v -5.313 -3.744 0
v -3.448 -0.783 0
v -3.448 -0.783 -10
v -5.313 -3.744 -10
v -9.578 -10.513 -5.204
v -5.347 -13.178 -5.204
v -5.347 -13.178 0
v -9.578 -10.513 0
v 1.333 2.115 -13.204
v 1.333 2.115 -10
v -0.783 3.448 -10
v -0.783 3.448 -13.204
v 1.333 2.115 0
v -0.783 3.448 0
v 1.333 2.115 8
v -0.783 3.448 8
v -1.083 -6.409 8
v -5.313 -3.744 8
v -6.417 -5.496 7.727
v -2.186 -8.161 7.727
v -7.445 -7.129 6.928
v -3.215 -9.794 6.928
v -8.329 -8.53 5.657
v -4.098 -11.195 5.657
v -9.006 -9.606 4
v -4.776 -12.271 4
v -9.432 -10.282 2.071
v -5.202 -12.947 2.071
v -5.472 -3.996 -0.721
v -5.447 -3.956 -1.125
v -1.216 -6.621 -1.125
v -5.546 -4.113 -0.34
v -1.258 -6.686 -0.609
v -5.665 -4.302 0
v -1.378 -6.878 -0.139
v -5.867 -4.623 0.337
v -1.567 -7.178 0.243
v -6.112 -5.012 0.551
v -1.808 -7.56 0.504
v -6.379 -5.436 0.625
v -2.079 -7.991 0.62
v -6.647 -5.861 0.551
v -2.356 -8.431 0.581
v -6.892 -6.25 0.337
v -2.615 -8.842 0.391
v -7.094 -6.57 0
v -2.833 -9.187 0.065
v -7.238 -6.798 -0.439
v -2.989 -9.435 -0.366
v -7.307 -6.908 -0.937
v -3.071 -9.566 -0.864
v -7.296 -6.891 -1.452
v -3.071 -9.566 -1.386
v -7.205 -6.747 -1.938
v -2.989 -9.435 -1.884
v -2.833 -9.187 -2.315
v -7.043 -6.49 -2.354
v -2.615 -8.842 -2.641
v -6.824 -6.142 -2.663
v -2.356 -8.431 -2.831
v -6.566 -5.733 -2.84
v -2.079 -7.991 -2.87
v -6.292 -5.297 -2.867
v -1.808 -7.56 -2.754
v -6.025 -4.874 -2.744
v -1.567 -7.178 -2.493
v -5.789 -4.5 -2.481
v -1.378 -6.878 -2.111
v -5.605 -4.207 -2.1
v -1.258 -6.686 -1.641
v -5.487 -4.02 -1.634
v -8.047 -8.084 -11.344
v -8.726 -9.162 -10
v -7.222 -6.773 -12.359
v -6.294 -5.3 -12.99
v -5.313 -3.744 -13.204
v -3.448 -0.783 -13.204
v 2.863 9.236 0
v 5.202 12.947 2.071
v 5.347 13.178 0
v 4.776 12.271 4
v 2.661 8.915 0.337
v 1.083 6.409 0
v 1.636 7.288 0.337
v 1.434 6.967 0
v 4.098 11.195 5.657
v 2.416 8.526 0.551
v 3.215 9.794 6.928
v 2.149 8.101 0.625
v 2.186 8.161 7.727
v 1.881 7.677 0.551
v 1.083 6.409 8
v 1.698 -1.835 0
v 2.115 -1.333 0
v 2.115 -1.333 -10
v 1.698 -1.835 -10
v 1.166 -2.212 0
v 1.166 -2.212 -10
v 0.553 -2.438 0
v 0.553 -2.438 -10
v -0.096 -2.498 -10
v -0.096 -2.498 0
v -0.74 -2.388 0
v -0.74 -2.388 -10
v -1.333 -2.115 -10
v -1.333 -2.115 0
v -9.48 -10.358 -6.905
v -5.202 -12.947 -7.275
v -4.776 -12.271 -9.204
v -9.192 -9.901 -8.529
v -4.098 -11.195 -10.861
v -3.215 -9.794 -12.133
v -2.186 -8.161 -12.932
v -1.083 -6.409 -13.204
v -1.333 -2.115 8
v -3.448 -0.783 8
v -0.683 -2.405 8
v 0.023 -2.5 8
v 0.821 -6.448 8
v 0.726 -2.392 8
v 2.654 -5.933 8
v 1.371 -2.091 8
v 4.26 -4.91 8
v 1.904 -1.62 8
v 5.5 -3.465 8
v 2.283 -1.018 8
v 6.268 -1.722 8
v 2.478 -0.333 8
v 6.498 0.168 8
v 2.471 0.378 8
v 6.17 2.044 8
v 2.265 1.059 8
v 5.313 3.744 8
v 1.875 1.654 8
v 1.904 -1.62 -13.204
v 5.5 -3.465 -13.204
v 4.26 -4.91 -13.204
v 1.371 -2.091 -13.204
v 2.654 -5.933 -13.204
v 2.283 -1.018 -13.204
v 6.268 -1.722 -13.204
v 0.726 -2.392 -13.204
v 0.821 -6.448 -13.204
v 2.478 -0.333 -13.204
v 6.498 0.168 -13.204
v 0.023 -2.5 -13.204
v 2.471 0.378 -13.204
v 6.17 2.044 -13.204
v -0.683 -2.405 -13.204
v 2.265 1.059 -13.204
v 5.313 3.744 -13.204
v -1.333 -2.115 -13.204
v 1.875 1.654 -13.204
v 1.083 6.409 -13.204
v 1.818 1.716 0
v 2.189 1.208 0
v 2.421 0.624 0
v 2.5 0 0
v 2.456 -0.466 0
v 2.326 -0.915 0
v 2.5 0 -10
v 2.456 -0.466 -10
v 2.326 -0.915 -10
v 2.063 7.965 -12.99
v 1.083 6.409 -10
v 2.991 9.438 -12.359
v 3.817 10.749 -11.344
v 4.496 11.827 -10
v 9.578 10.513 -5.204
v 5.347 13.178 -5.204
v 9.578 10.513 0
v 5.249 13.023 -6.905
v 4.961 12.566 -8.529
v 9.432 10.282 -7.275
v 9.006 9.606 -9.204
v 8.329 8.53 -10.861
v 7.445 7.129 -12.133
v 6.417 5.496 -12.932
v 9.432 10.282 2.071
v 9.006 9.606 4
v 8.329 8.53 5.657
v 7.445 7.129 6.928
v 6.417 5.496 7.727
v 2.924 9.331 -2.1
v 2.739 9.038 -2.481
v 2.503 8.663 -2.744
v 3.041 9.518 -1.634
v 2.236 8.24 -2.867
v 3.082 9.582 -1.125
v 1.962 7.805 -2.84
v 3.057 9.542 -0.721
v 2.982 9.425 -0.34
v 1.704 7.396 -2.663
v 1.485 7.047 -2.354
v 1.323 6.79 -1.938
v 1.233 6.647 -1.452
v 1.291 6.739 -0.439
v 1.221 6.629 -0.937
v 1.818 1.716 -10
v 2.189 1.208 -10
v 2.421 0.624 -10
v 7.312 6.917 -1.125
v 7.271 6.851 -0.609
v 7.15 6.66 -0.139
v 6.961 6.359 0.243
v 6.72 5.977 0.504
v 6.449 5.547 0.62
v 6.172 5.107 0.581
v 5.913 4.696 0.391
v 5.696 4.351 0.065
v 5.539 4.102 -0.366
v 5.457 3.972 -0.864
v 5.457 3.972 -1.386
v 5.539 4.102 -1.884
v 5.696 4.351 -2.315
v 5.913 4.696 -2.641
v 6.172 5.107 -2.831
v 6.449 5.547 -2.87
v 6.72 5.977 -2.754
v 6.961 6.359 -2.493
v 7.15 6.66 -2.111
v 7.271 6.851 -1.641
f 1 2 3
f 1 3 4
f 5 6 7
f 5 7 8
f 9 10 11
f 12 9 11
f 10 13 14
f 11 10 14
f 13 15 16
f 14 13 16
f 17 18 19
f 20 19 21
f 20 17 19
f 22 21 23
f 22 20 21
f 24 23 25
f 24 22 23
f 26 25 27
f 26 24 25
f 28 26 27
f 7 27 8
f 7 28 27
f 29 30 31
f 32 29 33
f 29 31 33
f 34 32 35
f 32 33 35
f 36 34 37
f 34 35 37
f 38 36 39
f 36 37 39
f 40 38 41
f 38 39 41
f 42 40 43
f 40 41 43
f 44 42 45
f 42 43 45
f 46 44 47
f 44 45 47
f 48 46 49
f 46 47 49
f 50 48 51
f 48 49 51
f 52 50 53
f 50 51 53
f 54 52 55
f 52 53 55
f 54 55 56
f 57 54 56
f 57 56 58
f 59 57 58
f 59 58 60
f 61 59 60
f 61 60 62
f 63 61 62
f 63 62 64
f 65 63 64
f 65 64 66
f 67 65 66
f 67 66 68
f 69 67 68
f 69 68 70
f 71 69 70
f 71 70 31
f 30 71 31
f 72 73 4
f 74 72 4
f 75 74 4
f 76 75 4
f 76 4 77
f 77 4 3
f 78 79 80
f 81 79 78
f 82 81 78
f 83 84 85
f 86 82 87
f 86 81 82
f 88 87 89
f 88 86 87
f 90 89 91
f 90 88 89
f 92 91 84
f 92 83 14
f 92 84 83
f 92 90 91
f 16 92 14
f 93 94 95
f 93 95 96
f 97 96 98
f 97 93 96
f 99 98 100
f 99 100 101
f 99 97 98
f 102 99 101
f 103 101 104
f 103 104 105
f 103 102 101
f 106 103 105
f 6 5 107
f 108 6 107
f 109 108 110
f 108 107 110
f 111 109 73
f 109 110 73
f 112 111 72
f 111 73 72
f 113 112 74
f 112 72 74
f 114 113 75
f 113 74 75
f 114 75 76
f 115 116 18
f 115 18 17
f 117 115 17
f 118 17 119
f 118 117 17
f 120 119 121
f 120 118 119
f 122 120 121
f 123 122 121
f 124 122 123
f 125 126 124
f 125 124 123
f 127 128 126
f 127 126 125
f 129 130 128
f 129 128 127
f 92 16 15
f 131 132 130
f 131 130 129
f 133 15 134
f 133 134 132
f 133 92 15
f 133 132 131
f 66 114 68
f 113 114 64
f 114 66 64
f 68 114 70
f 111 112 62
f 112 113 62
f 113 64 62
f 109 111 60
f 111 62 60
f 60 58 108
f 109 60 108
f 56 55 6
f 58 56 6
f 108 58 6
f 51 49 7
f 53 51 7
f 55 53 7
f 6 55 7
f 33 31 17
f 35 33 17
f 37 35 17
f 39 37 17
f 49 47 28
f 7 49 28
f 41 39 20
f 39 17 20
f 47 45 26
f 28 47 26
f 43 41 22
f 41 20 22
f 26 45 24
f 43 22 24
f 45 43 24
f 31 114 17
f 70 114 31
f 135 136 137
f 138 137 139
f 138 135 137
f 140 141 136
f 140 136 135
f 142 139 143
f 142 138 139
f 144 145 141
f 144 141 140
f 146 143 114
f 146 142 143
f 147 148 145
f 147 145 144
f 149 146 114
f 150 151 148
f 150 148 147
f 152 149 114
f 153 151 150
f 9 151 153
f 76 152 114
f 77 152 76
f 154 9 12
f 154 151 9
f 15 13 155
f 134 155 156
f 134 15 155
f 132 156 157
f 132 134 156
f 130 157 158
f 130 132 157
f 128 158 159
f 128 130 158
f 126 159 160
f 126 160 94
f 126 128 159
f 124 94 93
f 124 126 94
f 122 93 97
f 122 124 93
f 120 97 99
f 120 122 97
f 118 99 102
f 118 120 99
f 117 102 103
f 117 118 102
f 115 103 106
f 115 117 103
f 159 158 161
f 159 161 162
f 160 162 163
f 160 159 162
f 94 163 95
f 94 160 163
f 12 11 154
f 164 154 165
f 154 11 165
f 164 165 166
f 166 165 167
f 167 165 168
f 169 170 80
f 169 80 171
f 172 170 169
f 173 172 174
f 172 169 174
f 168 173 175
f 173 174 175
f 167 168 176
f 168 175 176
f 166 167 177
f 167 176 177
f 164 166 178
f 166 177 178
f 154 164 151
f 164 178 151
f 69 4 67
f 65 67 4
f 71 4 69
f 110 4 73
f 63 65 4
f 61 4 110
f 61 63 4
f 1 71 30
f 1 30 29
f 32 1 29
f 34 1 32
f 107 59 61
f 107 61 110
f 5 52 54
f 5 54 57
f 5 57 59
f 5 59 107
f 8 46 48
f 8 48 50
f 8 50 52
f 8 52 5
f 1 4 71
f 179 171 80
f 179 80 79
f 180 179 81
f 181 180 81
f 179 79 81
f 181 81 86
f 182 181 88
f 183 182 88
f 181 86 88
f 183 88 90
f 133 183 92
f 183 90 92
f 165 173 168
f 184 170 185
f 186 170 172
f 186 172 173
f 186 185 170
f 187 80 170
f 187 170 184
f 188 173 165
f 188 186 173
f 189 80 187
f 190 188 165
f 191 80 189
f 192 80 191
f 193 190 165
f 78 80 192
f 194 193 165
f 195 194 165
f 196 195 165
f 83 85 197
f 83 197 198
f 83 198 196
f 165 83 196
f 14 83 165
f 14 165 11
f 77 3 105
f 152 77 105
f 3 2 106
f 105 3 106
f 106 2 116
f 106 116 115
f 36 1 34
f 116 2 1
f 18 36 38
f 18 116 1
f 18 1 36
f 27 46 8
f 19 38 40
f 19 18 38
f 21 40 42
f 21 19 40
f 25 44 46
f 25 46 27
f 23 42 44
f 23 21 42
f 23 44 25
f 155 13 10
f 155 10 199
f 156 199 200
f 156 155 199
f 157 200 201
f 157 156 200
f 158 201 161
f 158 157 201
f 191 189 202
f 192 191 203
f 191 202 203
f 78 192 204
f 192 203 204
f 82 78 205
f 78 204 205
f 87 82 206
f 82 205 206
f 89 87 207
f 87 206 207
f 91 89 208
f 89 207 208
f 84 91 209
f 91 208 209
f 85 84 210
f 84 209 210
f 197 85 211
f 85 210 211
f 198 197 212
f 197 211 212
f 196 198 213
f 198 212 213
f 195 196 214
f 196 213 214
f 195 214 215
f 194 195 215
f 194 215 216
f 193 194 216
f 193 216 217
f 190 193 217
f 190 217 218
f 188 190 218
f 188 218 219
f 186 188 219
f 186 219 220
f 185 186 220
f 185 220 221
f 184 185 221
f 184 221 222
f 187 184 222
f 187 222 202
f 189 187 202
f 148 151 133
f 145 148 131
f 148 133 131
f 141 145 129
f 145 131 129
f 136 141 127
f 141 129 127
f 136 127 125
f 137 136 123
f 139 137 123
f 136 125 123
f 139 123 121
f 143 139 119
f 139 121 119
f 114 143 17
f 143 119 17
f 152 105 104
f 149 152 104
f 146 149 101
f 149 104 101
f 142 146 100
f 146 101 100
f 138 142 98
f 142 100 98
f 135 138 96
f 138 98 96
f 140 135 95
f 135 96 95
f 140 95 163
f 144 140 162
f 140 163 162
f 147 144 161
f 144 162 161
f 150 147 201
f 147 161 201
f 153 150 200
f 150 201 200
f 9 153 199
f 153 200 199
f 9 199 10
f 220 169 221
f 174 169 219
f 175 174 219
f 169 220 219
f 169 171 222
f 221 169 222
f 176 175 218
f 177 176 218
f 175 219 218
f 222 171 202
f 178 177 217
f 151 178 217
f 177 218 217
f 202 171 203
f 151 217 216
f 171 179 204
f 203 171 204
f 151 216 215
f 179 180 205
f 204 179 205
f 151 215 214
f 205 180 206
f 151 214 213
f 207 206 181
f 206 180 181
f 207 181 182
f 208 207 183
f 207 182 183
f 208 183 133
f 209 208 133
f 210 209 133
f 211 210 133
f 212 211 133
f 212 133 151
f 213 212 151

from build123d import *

# Parameters (mm, degrees)
BOSS_EXTRUDE2_DEPTH = 10
BOSS_EXTRUDE3_START = 8
BOSS_EXTRUDE3_DEPTH = 8
CUT_EXTRUDE1_REACH  = 23.149
SKETCH3_R           = 1.75
BOSS_EXTRUDE4_DEPTH = 3.204301934
FILLET2_R           = 8


with BuildPart() as part:
    # Sketch1 → Boss-Extrude2 (new body)
    with BuildSketch(Plane.XY):
        with BuildLine():
            Line((2.115260933, -1.332543126), (-1.082842756, -6.409169335))
            ThreePointArc((-1.082842756, -6.409169335), (5.499678326, -3.464612288), (5.313364545, 3.744082959))
            Line((5.313364545, 3.744082959), (2.115260933, -1.332543126))
        make_face()
        with BuildLine():
            Line((-3.447804083, -0.782717707), (-5.313364545, -3.744082959))
            ThreePointArc((-5.313364545, -3.744082959), (-3.464612288, -5.499678326), (-1.082842756, -6.409169335))
            Line((-1.082842756, -6.409169335), (2.115260933, -1.332543126))
            ThreePointArc((2.115260933, -1.332543126), (0.553465034, -2.437965639), (-1.332543188, -2.115260895))
            Line((-1.332543188, -2.115260895), (-3.447804083, -0.782717707))
        make_face()
        with BuildLine():
            Line((-5.313364545, -3.744082959), (-9.577502747, -10.512917822))
            Line((-9.577502747, -10.512917822), (-5.346980957, -13.178004198))
            Line((-5.346980957, -13.178004198), (-1.082842756, -6.409169335))
            ThreePointArc((-1.082842756, -6.409169335), (-3.464612288, -5.499678326), (-5.313364545, -3.744082959))
        make_face()
        with BuildLine():
            ThreePointArc((2.5, 0), (2.401890124, -0.693486722), (2.115260933, -1.332543126))
            Line((2.115260933, -1.332543126), (5.313364545, 3.744082959))
            ThreePointArc((5.313364545, 3.744082959), (3.464612288, 5.499678326), (1.082842756, 6.409169335))
            Line((1.082842756, 6.409169335), (-0.782717707, 3.447804083))
            Line((-0.782717707, 3.447804083), (1.332543188, 2.115260895))
            ThreePointArc((1.332543188, 2.115260895), (2.188761975, 1.208023599), (2.5, 0))
        make_face()
        with BuildLine():
            ThreePointArc((1.082842756, 6.409169335), (3.464612288, 5.499678326), (5.313364545, 3.744082959))
            Line((5.313364545, 3.744082959), (9.577502747, 10.512917822))
            Line((9.577502747, 10.512917822), (5.346980957, 13.178004198))
            Line((5.346980957, 13.178004198), (1.082842756, 6.409169335))
        make_face()
    extrude(amount=-BOSS_EXTRUDE2_DEPTH)

    # Sketch2 → Boss-Extrude3 (add)
    with BuildSketch(Plane.XY.offset(BOSS_EXTRUDE3_START)):
        with BuildLine():
            Line((5.313364545, 3.744082959), (9.577502747, 10.512917822))
            Line((9.577502747, 10.512917822), (5.346980957, 13.178004198))
            Line((5.346980957, 13.178004198), (-0.782717707, 3.447804083))
            Line((-0.782717707, 3.447804083), (1.332543188, 2.115260895))
            ThreePointArc((1.332543188, 2.115260895), (2.115260895, -1.332543188), (-1.332543188, -2.115260895))
            Line((-1.332543188, -2.115260895), (-3.447804083, -0.782717707))
            Line((-3.447804083, -0.782717707), (-9.577502747, -10.512917822))
            Line((-9.577502747, -10.512917822), (-5.346980957, -13.178004198))
            Line((-5.346980957, -13.178004198), (-1.082842756, -6.409169335))
            ThreePointArc((-1.082842756, -6.409169335), (5.499678326, -3.464612288), (5.313364545, 3.744082959))
        make_face()
    extrude(amount=-BOSS_EXTRUDE3_DEPTH)

    # Sketch3 → Cut-Extrude1 (cut, up to next)
    with BuildSketch(Plane(origin=(2.115260895, -1.332543188, 0), x_dir=(0, 0, -1), z_dir=(0.8461043578704048, -0.5330172751353468, 0)), mode=Mode.PRIVATE) as cut_extrude1_sk1:
        with Locations(Location((1.124998711, 8, 0), (0, 0, 90))):
            Circle(SKETCH3_R)
    cut_extrude1_tool1 = extrude(cut_extrude1_sk1.sketch, amount=-CUT_EXTRUDE1_REACH, mode=Mode.PRIVATE) & part.part
    # Sketch3 → Cut-Extrude1 (cut, up to next)
    with BuildSketch(Plane(origin=(2.115260895, -1.332543188, 0), x_dir=(0, 0, -1), z_dir=(0.8461043578704048, -0.5330172751353468, 0)), mode=Mode.PRIVATE) as cut_extrude1_sk2:
        with Locations(Location((1.124998711, -8, 0), (0, 0, 90))):
            Circle(SKETCH3_R)
    cut_extrude1_tool2 = extrude(cut_extrude1_sk2.sketch, amount=-CUT_EXTRUDE1_REACH, mode=Mode.PRIVATE) & part.part
    add(cut_extrude1_tool1.solids().sort_by_distance((6.379399, 5.436292, -1.124999))[0], mode=Mode.SUBTRACT)
    add(cut_extrude1_tool2.solids().sort_by_distance((-2.148877, -8.101378, -1.124999))[0], mode=Mode.SUBTRACT)

    # Sketch4 → Boss-Extrude4 (add)
    with BuildSketch(Plane(origin=(0, 0, -10), x_dir=(-1, 0, 0), z_dir=(0, 0, -1))):
        with BuildLine():
            Line((1.082842756, -6.409169335), (5.346980957, -13.178004198))
            Line((5.346980957, -13.178004198), (9.577502747, -10.512917822))
            Line((9.577502747, -10.512917822), (3.447804083, -0.782717707))
            Line((3.447804083, -0.782717707), (1.332543188, -2.115260895))
            ThreePointArc((1.332543188, -2.115260895), (-2.115260895, -1.332543188), (-1.332543188, 2.115260895))
            Line((-1.332543188, 2.115260895), (0.782717707, 3.447804083))
            Line((0.782717707, 3.447804083), (-5.346980957, 13.178004198))
            Line((-5.346980957, 13.178004198), (-9.577502747, 10.512917822))
            Line((-9.577502747, 10.512917822), (-5.313364545, 3.744082959))
            ThreePointArc((-5.313364545, 3.744082959), (-5.499678326, -3.464612288), (1.082842756, -6.409169335))
        make_face()
    extrude(amount=BOSS_EXTRUDE4_DEPTH)

    # Fillet2
    fillet2_edges = [part.edges().sort_by_distance(p)[0] for p in [
        (-7.462241852, -11.84546101, -13.204301934),
        (-7.462241852, -11.84546101, 8),
        (7.462241852, 11.84546101, 8),
        (7.462241852, 11.84546101, -13.204301934),
    ]]
    fillet(fillet2_edges, radius=FILLET2_R)


solid = part.part
